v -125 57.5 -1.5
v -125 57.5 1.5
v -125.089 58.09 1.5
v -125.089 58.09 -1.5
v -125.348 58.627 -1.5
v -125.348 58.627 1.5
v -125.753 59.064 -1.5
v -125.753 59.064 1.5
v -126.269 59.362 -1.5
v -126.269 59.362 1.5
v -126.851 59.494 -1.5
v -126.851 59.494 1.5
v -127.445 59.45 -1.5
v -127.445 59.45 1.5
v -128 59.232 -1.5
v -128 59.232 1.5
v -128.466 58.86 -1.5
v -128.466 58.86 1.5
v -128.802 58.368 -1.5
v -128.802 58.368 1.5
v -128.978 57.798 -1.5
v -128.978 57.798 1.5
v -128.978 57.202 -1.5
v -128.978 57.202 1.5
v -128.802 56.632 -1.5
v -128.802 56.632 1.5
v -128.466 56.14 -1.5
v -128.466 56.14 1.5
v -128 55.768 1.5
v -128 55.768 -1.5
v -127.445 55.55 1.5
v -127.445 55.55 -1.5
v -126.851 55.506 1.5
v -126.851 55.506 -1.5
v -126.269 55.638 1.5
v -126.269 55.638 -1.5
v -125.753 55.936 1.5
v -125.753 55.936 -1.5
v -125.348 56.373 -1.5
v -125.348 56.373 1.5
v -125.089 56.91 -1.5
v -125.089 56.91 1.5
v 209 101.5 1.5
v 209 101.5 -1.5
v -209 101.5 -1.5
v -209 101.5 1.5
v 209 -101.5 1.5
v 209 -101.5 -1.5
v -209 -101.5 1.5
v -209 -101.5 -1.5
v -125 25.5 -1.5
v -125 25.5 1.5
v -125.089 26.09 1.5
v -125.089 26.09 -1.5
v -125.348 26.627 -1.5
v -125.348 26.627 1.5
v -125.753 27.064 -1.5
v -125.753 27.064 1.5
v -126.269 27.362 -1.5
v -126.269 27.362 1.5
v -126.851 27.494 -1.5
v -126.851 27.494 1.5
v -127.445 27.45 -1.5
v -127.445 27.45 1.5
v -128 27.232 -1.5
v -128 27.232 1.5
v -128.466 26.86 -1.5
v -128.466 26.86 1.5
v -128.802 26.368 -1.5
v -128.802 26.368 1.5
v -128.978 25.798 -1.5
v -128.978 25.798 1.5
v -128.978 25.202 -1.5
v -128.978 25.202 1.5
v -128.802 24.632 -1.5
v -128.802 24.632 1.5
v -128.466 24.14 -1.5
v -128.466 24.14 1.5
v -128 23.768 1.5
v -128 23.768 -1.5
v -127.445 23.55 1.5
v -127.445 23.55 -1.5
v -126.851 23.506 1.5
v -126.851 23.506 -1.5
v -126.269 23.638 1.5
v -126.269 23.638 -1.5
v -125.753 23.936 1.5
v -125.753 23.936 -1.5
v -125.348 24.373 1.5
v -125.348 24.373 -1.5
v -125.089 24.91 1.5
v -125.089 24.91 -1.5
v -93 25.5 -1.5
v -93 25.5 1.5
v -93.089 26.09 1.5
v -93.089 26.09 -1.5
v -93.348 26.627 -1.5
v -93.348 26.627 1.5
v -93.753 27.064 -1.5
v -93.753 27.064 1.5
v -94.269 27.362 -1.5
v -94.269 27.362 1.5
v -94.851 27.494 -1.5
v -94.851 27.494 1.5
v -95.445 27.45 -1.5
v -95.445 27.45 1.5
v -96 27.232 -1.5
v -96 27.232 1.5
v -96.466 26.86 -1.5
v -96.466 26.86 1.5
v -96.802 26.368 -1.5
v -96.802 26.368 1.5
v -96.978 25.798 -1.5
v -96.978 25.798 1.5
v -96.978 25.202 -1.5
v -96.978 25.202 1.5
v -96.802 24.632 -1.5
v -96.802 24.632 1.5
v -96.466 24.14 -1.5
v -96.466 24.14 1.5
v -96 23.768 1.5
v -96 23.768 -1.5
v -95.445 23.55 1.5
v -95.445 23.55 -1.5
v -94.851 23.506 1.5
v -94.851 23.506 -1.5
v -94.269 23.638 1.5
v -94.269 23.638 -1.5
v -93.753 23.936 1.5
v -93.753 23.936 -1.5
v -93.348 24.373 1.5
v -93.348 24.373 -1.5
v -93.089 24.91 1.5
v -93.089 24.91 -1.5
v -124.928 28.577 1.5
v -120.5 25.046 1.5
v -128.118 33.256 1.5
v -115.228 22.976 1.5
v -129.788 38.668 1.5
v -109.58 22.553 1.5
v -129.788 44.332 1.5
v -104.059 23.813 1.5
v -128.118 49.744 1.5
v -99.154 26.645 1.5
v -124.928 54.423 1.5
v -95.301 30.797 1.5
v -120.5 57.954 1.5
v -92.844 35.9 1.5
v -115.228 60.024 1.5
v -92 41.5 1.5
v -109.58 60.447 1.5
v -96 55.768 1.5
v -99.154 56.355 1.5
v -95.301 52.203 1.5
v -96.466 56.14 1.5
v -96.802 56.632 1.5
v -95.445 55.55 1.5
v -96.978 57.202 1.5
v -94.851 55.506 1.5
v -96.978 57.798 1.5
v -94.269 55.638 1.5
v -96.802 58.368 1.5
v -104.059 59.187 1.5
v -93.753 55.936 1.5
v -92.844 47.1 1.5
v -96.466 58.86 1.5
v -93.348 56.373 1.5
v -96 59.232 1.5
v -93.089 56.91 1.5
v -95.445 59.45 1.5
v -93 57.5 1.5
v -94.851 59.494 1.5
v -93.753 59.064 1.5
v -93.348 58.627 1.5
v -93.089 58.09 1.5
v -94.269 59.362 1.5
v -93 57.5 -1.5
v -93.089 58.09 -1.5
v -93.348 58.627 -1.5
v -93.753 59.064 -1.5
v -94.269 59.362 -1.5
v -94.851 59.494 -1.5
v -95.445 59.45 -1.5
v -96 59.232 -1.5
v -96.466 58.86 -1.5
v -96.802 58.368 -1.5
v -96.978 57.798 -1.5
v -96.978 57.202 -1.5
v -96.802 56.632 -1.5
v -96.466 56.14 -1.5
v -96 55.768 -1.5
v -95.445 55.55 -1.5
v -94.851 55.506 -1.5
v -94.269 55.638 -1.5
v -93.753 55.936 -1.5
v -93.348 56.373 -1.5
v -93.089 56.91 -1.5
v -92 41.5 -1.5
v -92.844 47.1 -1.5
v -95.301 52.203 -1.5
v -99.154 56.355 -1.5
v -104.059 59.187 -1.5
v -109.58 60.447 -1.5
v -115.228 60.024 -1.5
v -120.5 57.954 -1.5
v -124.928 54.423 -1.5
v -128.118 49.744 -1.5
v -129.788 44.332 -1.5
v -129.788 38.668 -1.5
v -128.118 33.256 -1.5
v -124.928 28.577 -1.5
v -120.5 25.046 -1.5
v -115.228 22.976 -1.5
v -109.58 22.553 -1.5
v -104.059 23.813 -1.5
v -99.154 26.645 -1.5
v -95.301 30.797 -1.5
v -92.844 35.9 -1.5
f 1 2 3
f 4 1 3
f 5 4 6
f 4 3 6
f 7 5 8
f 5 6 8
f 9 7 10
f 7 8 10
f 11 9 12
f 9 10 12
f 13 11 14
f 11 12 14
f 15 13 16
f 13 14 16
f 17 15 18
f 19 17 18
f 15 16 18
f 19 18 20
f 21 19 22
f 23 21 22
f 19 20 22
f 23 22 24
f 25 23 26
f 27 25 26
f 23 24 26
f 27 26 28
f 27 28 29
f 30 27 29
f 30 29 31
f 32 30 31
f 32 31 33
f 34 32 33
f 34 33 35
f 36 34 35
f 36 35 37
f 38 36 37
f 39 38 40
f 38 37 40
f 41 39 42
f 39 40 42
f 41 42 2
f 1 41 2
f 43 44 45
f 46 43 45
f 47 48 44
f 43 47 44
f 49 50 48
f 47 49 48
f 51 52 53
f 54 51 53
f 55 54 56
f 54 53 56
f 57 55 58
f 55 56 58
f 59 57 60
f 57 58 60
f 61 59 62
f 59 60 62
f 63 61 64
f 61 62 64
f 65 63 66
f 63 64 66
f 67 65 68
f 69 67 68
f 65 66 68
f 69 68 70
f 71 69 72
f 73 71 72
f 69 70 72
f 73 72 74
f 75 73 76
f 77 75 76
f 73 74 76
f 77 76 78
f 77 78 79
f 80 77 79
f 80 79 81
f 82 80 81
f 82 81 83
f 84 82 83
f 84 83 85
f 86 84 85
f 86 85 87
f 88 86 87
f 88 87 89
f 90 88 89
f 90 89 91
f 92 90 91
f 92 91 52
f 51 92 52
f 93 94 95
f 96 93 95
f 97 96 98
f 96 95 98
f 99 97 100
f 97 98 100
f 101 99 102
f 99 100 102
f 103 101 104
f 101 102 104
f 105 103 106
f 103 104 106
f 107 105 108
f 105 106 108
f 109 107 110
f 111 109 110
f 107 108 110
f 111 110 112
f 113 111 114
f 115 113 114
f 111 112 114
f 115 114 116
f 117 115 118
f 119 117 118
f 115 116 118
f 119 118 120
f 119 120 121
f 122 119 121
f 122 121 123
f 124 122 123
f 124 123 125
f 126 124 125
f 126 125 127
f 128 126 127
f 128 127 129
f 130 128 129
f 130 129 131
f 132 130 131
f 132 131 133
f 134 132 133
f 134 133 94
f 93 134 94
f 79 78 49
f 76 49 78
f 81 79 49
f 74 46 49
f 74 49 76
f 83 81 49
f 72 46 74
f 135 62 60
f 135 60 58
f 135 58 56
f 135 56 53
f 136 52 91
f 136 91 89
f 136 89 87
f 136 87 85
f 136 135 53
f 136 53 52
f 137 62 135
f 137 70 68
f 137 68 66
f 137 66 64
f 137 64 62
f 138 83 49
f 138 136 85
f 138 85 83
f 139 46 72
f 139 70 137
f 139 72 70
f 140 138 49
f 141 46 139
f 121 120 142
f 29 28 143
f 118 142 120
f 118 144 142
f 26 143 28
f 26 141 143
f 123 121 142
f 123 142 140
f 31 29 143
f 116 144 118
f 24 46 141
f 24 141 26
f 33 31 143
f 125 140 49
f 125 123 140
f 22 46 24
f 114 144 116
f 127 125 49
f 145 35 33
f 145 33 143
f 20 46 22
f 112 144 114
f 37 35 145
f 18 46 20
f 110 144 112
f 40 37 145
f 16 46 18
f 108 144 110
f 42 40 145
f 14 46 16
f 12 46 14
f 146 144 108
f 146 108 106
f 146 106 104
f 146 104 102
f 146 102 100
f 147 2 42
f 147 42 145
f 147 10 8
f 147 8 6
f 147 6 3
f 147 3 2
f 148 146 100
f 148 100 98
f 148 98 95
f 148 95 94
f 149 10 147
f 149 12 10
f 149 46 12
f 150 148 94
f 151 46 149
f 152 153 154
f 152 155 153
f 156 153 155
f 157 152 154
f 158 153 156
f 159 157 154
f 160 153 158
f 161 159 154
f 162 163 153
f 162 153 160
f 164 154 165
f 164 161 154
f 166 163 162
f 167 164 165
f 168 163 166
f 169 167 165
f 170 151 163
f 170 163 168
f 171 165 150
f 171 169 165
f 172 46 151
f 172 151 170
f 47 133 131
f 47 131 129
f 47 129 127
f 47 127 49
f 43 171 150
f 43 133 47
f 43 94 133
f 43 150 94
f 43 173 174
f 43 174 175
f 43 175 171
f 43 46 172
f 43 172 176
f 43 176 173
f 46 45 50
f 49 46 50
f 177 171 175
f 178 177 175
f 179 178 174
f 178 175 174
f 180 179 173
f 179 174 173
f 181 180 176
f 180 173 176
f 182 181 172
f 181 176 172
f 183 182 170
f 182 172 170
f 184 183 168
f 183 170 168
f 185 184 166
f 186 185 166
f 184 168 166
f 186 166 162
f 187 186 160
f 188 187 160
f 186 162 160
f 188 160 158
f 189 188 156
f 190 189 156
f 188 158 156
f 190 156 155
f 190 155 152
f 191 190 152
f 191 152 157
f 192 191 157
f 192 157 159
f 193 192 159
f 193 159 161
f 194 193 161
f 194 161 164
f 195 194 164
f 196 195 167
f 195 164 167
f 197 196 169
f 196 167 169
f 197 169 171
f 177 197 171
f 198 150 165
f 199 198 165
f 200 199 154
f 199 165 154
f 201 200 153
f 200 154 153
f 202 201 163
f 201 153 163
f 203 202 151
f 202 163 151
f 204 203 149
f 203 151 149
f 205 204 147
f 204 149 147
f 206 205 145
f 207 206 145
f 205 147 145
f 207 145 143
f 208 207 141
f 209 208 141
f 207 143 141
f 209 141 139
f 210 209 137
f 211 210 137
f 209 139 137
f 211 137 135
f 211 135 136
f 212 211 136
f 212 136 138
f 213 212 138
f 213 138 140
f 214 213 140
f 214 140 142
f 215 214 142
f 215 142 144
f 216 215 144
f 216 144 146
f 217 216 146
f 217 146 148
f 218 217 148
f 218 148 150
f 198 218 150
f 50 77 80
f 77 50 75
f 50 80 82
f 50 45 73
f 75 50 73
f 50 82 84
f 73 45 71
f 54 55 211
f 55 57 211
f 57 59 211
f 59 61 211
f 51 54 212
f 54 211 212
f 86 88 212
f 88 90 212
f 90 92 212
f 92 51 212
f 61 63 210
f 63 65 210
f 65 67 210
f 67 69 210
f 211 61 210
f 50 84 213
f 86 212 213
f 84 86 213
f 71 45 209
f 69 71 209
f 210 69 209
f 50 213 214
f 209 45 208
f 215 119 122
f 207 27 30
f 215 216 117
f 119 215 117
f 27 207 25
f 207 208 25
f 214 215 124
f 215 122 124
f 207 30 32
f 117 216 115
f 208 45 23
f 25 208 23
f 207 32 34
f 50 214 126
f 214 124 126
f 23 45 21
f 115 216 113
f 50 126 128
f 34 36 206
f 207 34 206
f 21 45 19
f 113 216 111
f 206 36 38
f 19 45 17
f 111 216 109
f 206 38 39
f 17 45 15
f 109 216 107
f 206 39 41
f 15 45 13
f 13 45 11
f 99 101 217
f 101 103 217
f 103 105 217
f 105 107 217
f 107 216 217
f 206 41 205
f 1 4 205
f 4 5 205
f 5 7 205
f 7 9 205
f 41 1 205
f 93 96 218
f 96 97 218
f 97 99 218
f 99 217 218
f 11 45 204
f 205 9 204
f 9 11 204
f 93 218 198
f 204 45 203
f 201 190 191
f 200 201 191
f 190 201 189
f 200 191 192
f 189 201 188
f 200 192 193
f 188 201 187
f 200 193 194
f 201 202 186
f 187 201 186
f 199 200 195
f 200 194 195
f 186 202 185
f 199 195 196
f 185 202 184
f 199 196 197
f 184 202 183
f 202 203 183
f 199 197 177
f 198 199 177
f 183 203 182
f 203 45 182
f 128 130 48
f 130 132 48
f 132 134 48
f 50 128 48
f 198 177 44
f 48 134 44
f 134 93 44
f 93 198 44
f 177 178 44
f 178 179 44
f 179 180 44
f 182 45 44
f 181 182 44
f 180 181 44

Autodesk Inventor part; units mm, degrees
ref_plane "YZ Plane" through (0, 0, 0) normal (1, 0, 0) x (0, 1, 0)
ref_plane "XZ Plane" through (0, 0, 0) normal (0, 1, 0) x (-1, 0, 0)
ref_plane "XY Plane" through (0, 0, 0) normal (0, 0, 1) x (1, 0, 0)
sketch "Szkic1" plane through (0, 0, 0) normal (0, 0, 1) x (1, 0, 0)
  line L0 (209, 101.5) -> (-209, 101.5)
  line L1 (-209, 101.5) -> (-209, -101.5)
  line L2 (-209, -101.5) -> (209, -101.5)
  line L3 (209, -101.5) -> (209, 101.5)
  line L4 (209, 101.5) -> (-209, -101.5) construction
  line L5 (-209, 101.5) -> (209, -101.5) construction
  point P0 (0, 0)
  dimension "d0" = 418
  dimension "d1" = 203
extrude "Wyciągnięcie proste1" add sketch "Szkic1" along normal mid plane 3
sketch "Szkic2" plane through (0, 0, 1.5) normal (0, 0, 1) x (1, 0, 0)
  circle A0 centre (-111, 41.5) radius 19
  line L0 (-209, 101.5) -> (-209, -101.5) projected
  line L1 (209, 101.5) -> (-209, 101.5) projected
  line L2 (-95, 25.5) -> (-127, 25.5)
  line L3 (-127, 25.5) -> (-127, 57.5)
  line L4 (-127, 57.5) -> (-95, 57.5)
  line L5 (-95, 57.5) -> (-95, 25.5)
  circle A1 centre (-127, 57.5) radius 2
  circle A2 centre (-95, 57.5) radius 2
  circle A3 centre (-95, 25.5) radius 2
  circle A4 centre (-127, 25.5) radius 2
  line L6 (-209, -101.5) -> (209, -101.5) projected
  line L7 (209, -101.5) -> (209, 101.5) projected
  line L8 (-209, 80.5) -> (-209, 91.5)
  point P0 (0, 0)
  dimension "d7" = 32
  dimension "d8" = 32
  dimension "d9" = 4
  dimension "d10" = 4
  dimension "d12" = 4
  dimension "d105" = 38
  dimension "d106" = 44
  dimension "d107" = 304
  dimension "d108" = 60
  dimension "d109" = 320
  dimension "d110" = 10
  dimension "d111" = 21
extrude "Wyciągnięcie proste3" cut sketch "Szkic2" against normal through all contours A2 L4 L5 | L5 L4 A2 | A3 L2 L5 | L5 L2 A3 | A1 L3 L4 | L4 L3 A1 | A4 L3 L2 | L2 L3 A4
extrude "Wyciągnięcie proste4" cut sketch "Szkic2" against normal through all contours A0 L5 | L5 A0 L2 L3 L4 | L4 A0 | A0 L2 | L3 A0
properties part number "BackWall"
